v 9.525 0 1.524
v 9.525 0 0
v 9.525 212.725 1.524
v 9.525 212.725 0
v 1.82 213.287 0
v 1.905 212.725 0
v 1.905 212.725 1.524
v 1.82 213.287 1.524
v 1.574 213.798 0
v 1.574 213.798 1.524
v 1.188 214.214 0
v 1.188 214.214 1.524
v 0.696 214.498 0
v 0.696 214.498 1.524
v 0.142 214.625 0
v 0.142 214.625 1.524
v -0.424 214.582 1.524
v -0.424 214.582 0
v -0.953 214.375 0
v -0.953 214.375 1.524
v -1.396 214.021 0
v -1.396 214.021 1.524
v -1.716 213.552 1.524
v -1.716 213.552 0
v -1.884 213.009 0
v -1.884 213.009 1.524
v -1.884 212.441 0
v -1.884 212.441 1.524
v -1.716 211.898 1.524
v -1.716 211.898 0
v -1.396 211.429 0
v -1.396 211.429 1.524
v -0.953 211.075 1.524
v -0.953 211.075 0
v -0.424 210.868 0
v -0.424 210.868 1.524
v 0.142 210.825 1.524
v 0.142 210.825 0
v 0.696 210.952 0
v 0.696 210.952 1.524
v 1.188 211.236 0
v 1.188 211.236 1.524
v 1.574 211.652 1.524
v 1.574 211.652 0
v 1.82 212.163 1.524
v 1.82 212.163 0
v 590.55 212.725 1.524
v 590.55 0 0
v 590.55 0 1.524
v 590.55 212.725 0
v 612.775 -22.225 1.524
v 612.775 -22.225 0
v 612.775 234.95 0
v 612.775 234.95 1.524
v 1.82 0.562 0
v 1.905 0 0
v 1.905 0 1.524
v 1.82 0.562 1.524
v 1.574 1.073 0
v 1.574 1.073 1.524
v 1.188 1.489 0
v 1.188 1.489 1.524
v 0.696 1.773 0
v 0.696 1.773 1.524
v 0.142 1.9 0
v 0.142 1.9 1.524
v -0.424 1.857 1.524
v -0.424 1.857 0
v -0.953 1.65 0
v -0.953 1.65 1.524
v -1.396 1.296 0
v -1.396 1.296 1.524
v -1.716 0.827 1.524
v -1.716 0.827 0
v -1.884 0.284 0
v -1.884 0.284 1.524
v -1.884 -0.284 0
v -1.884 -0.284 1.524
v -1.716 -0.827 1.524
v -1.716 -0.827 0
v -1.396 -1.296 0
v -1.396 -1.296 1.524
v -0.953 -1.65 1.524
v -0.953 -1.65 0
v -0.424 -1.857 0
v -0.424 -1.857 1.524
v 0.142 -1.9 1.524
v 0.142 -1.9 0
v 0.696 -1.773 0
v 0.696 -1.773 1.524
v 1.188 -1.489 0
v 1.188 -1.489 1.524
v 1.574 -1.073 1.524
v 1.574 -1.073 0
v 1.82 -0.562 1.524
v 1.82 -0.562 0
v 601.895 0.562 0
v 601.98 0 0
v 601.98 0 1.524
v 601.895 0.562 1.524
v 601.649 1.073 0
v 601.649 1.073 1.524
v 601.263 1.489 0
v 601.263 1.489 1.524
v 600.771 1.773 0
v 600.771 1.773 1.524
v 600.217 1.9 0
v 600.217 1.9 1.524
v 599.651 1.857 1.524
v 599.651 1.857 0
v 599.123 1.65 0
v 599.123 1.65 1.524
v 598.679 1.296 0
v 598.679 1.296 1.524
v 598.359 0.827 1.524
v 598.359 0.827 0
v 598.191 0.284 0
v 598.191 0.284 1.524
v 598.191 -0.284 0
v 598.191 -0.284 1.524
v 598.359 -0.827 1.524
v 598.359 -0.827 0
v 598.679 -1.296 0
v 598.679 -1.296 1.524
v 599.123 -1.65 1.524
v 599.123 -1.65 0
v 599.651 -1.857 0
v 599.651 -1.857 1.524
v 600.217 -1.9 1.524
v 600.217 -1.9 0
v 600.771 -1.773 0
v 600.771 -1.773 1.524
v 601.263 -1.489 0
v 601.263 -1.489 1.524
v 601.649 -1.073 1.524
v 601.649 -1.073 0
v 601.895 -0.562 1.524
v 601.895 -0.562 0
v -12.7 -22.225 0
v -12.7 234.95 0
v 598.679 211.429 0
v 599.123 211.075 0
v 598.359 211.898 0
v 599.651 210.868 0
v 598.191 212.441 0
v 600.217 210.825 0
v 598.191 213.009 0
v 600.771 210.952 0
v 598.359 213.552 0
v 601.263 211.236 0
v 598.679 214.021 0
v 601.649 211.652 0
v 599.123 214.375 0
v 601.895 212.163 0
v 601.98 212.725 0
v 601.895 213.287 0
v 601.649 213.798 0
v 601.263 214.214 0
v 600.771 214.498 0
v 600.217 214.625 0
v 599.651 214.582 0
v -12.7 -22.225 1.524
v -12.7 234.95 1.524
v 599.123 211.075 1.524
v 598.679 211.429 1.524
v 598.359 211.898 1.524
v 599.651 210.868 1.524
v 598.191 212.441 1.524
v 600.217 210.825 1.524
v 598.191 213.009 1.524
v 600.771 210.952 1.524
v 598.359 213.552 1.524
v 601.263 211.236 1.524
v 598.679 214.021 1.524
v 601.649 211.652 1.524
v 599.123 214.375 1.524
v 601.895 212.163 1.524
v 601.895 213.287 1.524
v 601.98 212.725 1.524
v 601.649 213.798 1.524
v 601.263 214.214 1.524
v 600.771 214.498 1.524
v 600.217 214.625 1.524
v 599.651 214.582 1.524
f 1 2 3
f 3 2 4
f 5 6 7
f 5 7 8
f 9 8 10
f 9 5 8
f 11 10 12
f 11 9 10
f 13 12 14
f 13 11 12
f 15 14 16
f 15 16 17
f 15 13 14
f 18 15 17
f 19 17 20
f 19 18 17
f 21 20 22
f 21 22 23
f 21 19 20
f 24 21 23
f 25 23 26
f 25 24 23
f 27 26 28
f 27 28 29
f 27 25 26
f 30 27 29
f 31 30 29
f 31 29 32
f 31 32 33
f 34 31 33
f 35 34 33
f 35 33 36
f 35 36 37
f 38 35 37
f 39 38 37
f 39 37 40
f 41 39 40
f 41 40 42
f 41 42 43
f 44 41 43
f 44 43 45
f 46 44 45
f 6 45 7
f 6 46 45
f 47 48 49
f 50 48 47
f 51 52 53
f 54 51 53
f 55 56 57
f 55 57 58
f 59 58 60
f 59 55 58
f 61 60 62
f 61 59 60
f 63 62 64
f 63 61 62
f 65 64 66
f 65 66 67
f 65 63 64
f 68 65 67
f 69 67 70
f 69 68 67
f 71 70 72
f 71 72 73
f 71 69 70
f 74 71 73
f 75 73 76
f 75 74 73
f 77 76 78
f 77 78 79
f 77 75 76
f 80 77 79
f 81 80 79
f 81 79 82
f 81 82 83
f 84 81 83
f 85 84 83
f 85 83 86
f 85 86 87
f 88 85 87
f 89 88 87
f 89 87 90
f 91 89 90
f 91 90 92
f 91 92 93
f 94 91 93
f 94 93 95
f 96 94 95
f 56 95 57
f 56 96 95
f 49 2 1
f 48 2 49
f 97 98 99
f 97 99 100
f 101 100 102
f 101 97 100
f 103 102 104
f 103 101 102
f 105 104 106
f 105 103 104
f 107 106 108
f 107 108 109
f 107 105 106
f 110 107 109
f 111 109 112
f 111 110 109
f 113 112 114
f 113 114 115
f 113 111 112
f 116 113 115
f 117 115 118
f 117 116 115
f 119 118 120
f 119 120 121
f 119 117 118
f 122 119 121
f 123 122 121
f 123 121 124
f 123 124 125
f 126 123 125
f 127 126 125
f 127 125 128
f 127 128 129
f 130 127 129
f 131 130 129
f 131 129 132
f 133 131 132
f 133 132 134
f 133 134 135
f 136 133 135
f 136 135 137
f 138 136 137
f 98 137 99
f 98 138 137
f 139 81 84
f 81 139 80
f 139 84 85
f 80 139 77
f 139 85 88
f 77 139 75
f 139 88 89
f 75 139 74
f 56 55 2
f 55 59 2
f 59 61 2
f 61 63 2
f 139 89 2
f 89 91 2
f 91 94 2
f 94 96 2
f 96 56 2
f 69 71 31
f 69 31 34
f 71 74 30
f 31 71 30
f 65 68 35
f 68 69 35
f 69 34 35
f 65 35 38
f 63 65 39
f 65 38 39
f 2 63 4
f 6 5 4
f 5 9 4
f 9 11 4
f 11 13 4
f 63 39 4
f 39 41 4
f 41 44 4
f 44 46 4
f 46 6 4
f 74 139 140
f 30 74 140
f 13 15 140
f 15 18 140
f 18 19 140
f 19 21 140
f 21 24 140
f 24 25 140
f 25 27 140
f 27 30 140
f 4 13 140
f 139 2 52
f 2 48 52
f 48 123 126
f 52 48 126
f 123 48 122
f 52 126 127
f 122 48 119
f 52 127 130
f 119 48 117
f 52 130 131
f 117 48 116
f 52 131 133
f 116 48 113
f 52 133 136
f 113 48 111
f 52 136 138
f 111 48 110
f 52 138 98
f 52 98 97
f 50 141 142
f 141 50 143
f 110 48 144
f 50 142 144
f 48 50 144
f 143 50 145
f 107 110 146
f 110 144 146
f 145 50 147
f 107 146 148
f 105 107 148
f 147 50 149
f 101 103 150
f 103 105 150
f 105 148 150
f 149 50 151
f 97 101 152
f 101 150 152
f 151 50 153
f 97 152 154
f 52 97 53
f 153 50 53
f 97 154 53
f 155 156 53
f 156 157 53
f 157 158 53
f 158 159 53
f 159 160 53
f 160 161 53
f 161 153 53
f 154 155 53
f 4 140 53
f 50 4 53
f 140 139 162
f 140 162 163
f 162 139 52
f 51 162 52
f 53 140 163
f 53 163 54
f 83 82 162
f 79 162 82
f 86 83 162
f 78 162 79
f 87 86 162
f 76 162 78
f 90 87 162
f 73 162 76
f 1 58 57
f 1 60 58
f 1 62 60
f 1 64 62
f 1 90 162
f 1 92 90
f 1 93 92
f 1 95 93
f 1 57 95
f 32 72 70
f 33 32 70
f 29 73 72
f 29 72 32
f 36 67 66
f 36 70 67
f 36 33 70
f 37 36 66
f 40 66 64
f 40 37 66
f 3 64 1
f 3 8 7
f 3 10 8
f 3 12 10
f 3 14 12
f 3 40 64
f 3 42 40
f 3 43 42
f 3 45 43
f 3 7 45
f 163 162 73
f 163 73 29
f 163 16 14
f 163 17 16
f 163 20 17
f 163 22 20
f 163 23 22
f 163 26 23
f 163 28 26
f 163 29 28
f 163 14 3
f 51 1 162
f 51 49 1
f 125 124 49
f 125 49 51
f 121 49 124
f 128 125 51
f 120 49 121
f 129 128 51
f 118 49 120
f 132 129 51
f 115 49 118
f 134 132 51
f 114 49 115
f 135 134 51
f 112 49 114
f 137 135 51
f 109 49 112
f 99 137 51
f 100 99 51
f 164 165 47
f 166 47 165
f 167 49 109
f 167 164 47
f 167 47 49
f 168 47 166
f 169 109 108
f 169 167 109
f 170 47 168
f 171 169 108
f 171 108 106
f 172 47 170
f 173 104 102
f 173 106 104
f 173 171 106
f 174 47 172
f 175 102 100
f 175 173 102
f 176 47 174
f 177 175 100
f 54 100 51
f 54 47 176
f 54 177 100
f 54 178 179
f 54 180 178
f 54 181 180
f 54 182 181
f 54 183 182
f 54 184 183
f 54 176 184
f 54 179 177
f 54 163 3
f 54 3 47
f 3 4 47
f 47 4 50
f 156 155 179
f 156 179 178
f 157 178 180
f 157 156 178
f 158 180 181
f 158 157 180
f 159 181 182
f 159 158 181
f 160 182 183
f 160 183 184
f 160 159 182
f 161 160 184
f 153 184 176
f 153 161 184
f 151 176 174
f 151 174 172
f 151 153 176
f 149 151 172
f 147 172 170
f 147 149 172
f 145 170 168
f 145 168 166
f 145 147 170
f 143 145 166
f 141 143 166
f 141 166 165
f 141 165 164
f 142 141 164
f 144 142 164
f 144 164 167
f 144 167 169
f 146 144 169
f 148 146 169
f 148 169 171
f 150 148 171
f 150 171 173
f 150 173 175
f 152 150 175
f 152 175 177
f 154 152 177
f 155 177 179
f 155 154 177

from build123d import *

# Parameters (mm, degrees)
F0_W     = 625.475
F0_H     = 257.175
F0_R     = 1.905
F0_W_2   = 581.025
F0_H_2   = 212.725
F1_DEPTH = 1.524


with BuildPart() as f1:
    # F0 (on Top) → F1 (new body)
    with BuildSketch(Plane.XY):
        with Locations((300.0375, 106.3625)):
            Rectangle(F0_W, F0_H)
        Circle(F0_R, mode=Mode.SUBTRACT)
        with Locations((600.075, 0)):
            Circle(F0_R, mode=Mode.SUBTRACT)
        with Locations((300.0375, 106.3625)):
            Rectangle(F0_W_2, F0_H_2, mode=Mode.SUBTRACT)
        with Locations((0, 212.725)):
            Circle(F0_R, mode=Mode.SUBTRACT)
        with Locations((600.075, 212.725)):
            Circle(F0_R, mode=Mode.SUBTRACT)
    extrude(amount=F1_DEPTH)


solid = f1.part
